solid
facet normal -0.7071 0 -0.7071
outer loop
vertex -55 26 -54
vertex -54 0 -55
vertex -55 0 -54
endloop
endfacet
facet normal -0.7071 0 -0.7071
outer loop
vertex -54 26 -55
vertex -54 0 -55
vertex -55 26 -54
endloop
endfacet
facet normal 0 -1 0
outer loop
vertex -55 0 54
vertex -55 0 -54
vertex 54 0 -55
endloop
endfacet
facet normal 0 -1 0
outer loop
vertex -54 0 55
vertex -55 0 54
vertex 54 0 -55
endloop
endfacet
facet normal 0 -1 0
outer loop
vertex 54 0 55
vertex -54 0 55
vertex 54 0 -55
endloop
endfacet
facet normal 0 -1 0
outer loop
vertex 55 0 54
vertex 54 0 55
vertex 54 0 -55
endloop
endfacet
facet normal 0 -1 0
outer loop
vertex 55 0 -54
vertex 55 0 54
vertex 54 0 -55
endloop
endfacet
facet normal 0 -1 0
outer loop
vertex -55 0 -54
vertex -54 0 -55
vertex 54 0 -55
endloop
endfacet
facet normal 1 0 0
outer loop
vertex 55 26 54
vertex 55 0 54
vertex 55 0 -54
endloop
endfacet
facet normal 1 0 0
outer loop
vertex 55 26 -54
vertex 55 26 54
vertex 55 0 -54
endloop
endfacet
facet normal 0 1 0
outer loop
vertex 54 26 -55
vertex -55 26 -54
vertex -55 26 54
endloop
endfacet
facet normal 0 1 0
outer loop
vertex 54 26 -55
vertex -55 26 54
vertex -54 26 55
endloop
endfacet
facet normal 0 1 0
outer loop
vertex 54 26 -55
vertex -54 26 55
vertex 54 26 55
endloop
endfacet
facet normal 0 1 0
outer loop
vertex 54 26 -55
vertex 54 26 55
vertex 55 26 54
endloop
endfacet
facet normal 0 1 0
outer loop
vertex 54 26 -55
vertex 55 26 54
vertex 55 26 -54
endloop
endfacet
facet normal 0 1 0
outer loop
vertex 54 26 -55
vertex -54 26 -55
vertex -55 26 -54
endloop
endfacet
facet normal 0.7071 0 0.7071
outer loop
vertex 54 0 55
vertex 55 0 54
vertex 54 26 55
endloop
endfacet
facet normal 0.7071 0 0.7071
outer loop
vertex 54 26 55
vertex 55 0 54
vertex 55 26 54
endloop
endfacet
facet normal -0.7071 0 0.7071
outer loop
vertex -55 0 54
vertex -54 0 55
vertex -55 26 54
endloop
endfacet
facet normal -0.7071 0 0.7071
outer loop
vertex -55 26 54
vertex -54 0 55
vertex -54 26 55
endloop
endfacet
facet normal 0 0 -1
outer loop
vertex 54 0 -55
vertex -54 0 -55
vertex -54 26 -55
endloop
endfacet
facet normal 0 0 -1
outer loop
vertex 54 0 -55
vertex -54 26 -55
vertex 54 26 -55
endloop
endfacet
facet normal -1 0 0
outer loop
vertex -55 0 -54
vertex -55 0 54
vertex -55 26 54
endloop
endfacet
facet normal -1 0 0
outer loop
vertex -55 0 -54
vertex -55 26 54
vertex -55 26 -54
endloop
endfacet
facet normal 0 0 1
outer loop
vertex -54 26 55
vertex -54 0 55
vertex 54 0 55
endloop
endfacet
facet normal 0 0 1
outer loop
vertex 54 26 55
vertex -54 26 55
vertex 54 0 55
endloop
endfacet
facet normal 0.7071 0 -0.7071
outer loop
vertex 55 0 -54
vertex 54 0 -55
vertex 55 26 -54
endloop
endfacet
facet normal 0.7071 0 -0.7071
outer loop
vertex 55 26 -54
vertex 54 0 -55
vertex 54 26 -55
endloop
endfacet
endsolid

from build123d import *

# Parameters (mm, degrees)
SKETCH_1_W      = 110
SKETCH_1_H      = 110
EXTRUDE_1_DEPTH = 26
CHAMFER_1_SIZE  = 1


with BuildPart() as part:
    # 草图1 → 凸台-拉伸1 (new body)
    with BuildSketch(Plane(origin=(0, 0, 0), x_dir=(1, 0, 0), z_dir=(0, 1, 0))):
        Rectangle(SKETCH_1_W, SKETCH_1_H)
    extrude(amount=EXTRUDE_1_DEPTH)

    # 倒角1
    chamfer_1_edges = [part.edges().sort_by_distance(p)[0] for p in [
        (55, 13, 55),
        (-55, 13, 55),
        (-55, 13, -55),
        (55, 13, -55),
    ]]
    chamfer(chamfer_1_edges, length=CHAMFER_1_SIZE)


solid = part.part
